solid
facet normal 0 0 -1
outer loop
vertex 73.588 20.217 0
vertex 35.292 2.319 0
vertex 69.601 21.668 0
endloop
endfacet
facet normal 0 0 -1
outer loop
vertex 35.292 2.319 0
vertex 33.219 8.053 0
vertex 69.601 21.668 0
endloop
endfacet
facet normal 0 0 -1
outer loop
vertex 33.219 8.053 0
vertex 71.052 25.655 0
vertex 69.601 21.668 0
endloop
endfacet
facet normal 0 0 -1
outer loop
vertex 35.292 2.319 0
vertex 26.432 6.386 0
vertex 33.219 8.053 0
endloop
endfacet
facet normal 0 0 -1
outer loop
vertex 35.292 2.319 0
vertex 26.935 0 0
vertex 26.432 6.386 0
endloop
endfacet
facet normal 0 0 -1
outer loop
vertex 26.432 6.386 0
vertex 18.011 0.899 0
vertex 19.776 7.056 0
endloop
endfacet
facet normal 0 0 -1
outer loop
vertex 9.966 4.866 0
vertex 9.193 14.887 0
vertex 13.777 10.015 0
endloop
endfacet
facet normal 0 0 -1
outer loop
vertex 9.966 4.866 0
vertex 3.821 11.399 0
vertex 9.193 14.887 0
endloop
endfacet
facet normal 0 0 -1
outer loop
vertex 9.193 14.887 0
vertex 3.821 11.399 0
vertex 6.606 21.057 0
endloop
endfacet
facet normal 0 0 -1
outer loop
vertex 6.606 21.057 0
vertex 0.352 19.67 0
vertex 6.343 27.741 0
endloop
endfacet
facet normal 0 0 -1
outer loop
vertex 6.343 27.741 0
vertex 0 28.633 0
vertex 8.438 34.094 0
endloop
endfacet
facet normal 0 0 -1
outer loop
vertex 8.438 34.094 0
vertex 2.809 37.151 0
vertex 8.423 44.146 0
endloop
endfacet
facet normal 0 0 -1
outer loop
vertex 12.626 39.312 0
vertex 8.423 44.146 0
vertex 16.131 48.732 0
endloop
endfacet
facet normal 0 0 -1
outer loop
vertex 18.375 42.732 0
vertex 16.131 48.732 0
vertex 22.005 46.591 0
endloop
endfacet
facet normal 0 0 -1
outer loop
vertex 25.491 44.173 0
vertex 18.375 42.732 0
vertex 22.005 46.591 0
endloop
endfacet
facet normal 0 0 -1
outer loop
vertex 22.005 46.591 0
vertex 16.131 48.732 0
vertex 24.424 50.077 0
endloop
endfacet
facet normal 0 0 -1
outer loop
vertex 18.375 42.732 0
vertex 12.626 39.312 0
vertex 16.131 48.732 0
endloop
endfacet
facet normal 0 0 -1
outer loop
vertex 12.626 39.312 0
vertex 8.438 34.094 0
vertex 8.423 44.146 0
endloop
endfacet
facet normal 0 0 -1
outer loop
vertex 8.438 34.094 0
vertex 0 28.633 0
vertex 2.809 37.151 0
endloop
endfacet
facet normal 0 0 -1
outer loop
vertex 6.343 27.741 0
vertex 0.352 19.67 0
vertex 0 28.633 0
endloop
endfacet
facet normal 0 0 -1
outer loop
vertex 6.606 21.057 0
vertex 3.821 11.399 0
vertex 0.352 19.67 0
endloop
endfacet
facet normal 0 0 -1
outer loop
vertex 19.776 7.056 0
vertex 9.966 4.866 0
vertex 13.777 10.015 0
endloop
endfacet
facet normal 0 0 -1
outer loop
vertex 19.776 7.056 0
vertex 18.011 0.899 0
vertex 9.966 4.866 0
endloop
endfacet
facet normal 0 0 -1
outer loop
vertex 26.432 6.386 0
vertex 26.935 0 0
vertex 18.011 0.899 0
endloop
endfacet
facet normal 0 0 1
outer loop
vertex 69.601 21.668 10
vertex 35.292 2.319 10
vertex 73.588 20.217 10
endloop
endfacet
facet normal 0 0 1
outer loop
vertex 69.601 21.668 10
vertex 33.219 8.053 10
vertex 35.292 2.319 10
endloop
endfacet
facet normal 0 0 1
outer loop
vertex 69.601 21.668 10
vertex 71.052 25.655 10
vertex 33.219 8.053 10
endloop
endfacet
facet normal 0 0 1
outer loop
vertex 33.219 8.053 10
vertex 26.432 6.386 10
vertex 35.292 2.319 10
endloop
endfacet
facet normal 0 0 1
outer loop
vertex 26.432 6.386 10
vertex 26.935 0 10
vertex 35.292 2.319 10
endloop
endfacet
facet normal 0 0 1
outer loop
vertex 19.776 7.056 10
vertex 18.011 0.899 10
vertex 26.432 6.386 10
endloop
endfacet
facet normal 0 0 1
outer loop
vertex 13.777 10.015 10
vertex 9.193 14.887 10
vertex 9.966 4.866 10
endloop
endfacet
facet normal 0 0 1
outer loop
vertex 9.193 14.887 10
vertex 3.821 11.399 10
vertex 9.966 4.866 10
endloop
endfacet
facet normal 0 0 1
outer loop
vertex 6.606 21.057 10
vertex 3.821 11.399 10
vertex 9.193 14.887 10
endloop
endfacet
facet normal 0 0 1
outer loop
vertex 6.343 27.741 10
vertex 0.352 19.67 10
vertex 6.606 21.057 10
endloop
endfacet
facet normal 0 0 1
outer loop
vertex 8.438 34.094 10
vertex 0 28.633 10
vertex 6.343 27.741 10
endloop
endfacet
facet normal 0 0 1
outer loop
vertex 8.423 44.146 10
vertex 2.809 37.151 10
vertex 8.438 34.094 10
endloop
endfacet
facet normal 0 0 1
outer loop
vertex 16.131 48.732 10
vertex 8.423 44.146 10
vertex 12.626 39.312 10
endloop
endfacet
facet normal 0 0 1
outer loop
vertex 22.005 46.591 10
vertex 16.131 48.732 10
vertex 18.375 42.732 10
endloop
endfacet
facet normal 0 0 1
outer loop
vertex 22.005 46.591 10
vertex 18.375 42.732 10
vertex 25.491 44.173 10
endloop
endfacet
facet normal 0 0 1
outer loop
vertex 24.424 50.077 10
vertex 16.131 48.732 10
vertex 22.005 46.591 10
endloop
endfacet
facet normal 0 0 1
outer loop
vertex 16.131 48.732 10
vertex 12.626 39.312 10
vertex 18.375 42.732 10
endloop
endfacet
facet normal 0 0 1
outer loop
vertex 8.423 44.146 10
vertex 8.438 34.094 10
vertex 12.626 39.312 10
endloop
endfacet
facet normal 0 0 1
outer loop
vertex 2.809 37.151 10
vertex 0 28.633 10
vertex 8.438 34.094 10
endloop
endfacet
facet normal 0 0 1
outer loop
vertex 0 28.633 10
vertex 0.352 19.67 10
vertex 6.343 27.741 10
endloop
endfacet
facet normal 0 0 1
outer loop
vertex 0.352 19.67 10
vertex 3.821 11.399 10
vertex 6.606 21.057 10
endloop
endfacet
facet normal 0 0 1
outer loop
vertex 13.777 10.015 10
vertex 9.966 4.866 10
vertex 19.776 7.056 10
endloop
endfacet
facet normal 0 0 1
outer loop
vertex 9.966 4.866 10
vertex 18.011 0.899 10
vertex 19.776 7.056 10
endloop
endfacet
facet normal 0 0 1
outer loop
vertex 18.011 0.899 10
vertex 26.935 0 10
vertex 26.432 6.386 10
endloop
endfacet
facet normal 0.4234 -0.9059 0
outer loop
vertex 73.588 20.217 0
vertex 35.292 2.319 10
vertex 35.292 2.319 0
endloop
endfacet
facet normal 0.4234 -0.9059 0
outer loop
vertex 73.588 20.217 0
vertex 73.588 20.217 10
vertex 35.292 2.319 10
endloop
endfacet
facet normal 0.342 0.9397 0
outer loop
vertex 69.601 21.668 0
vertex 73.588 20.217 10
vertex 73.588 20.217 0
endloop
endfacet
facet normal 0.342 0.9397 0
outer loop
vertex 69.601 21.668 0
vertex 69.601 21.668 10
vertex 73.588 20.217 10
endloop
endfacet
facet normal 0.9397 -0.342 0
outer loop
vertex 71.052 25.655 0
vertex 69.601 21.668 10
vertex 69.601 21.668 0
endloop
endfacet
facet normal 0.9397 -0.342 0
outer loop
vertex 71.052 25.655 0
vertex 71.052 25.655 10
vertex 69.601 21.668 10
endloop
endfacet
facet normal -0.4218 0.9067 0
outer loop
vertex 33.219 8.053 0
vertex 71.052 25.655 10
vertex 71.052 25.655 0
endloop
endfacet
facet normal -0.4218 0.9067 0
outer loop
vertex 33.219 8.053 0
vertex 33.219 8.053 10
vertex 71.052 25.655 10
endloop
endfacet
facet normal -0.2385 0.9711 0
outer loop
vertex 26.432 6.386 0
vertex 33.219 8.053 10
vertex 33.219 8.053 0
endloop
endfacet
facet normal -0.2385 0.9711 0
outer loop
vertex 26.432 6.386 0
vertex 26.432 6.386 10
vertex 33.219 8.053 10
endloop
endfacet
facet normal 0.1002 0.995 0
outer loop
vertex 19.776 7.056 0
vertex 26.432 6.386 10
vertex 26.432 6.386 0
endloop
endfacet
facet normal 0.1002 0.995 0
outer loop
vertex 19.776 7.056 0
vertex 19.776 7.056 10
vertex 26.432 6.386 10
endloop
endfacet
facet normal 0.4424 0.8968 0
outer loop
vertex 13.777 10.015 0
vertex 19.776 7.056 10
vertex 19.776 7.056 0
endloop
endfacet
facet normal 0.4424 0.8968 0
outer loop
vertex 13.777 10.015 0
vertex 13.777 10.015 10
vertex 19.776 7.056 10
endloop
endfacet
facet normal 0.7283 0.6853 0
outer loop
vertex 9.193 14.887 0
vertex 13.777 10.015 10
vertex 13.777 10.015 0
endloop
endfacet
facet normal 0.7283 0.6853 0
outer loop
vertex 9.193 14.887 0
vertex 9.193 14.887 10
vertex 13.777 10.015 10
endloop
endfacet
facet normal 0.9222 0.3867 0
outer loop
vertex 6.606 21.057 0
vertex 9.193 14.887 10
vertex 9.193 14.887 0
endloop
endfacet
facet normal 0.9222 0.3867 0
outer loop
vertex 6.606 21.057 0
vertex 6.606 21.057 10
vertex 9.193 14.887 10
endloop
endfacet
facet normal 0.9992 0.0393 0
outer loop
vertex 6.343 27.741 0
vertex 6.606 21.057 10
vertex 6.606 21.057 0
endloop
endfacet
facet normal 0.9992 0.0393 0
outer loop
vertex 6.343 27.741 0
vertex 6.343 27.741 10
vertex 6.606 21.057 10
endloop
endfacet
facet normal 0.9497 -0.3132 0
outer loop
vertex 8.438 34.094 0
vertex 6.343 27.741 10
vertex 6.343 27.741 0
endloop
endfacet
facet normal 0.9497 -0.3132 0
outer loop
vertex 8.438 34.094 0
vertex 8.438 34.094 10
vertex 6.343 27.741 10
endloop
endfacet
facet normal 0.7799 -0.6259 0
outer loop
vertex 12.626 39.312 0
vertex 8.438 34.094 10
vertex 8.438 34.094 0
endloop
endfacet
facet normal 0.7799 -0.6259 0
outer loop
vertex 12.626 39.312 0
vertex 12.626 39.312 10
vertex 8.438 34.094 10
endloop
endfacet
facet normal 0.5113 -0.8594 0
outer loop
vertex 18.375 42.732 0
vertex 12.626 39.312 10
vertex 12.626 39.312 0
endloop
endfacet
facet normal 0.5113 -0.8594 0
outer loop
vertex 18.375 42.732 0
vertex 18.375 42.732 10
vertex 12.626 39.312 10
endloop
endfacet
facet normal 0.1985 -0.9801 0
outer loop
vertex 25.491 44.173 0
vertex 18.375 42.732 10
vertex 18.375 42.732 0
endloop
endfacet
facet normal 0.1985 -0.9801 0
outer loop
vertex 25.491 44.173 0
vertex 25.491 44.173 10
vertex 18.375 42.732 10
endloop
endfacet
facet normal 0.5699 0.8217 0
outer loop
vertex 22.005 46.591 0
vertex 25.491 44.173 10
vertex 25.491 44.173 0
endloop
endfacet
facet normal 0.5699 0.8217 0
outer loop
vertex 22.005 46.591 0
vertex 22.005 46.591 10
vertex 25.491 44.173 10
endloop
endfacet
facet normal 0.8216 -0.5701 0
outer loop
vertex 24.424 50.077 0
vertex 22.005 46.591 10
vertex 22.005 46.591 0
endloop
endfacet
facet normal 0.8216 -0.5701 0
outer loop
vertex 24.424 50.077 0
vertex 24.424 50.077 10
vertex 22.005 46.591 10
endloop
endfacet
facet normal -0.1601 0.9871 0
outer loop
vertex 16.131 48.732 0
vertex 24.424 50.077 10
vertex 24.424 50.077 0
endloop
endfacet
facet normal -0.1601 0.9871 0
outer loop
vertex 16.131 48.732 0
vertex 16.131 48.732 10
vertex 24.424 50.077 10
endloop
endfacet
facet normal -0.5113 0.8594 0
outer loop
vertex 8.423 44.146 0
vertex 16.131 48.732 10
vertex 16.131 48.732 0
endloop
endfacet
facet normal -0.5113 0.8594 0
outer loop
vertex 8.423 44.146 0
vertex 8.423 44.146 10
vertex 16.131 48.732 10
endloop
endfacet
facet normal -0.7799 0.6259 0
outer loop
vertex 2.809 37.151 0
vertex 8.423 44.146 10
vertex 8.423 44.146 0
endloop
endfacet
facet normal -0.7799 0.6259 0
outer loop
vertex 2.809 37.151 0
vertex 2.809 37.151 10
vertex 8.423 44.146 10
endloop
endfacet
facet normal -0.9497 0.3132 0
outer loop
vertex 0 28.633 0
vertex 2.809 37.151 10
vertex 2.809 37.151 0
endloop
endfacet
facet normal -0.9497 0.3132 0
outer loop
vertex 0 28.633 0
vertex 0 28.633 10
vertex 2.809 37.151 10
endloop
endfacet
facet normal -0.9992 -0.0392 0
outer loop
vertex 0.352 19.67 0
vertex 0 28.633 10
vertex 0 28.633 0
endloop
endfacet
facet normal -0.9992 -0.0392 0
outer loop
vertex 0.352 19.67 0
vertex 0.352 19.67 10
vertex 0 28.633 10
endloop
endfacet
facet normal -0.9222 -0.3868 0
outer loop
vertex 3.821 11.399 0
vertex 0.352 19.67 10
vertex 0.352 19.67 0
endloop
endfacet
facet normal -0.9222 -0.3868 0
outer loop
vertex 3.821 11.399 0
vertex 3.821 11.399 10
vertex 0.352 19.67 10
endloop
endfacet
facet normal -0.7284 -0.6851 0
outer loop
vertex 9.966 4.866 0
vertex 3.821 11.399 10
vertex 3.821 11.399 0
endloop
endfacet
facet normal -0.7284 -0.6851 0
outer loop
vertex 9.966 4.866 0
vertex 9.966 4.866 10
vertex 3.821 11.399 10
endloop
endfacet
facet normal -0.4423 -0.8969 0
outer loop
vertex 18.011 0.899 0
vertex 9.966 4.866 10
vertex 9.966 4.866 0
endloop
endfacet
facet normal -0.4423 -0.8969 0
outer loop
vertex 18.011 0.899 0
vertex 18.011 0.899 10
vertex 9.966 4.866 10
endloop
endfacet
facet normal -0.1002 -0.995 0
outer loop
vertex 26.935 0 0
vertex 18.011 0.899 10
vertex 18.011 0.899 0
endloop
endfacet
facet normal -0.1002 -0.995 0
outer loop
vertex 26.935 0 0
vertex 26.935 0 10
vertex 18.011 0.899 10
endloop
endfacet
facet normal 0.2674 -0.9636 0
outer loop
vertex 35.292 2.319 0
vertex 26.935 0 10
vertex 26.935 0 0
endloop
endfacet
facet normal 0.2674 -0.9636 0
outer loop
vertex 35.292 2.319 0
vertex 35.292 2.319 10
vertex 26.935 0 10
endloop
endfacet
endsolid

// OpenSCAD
$fn = 32;

// ----------------------------------------------------------------------
// Hook plate: curl radius 22 mm over 205 degrees, 6 mm thick band
// ----------------------------------------------------------------------

// --- parameters (mm) ---
profile_height = 10;      // extrusion height
profile_points = 26;      // points of the closed outline

profile = [[22.005, 46.591], [24.424, 50.077], [16.131, 48.732], [8.423, 44.146], [2.809, 37.151], [0, 28.633], [0.352, 19.67], [3.821, 11.399], [9.966, 4.866], [18.011, 0.899], [26.935, 0], [35.292, 2.319], [73.588, 20.217], [69.601, 21.668], [71.052, 25.655], [33.219, 8.053], [26.432, 6.386], [19.776, 7.056], [13.777, 10.015], [9.193, 14.887], [6.606, 21.057], [6.343, 27.741], [8.438, 34.094], [12.626, 39.312], [18.375, 42.732], [25.491, 44.173]];  // single closed polygon, 26 points, counter clockwise

// --- the one profile operation ---
linear_extrude(height = profile_height) polygon(points = profile);
